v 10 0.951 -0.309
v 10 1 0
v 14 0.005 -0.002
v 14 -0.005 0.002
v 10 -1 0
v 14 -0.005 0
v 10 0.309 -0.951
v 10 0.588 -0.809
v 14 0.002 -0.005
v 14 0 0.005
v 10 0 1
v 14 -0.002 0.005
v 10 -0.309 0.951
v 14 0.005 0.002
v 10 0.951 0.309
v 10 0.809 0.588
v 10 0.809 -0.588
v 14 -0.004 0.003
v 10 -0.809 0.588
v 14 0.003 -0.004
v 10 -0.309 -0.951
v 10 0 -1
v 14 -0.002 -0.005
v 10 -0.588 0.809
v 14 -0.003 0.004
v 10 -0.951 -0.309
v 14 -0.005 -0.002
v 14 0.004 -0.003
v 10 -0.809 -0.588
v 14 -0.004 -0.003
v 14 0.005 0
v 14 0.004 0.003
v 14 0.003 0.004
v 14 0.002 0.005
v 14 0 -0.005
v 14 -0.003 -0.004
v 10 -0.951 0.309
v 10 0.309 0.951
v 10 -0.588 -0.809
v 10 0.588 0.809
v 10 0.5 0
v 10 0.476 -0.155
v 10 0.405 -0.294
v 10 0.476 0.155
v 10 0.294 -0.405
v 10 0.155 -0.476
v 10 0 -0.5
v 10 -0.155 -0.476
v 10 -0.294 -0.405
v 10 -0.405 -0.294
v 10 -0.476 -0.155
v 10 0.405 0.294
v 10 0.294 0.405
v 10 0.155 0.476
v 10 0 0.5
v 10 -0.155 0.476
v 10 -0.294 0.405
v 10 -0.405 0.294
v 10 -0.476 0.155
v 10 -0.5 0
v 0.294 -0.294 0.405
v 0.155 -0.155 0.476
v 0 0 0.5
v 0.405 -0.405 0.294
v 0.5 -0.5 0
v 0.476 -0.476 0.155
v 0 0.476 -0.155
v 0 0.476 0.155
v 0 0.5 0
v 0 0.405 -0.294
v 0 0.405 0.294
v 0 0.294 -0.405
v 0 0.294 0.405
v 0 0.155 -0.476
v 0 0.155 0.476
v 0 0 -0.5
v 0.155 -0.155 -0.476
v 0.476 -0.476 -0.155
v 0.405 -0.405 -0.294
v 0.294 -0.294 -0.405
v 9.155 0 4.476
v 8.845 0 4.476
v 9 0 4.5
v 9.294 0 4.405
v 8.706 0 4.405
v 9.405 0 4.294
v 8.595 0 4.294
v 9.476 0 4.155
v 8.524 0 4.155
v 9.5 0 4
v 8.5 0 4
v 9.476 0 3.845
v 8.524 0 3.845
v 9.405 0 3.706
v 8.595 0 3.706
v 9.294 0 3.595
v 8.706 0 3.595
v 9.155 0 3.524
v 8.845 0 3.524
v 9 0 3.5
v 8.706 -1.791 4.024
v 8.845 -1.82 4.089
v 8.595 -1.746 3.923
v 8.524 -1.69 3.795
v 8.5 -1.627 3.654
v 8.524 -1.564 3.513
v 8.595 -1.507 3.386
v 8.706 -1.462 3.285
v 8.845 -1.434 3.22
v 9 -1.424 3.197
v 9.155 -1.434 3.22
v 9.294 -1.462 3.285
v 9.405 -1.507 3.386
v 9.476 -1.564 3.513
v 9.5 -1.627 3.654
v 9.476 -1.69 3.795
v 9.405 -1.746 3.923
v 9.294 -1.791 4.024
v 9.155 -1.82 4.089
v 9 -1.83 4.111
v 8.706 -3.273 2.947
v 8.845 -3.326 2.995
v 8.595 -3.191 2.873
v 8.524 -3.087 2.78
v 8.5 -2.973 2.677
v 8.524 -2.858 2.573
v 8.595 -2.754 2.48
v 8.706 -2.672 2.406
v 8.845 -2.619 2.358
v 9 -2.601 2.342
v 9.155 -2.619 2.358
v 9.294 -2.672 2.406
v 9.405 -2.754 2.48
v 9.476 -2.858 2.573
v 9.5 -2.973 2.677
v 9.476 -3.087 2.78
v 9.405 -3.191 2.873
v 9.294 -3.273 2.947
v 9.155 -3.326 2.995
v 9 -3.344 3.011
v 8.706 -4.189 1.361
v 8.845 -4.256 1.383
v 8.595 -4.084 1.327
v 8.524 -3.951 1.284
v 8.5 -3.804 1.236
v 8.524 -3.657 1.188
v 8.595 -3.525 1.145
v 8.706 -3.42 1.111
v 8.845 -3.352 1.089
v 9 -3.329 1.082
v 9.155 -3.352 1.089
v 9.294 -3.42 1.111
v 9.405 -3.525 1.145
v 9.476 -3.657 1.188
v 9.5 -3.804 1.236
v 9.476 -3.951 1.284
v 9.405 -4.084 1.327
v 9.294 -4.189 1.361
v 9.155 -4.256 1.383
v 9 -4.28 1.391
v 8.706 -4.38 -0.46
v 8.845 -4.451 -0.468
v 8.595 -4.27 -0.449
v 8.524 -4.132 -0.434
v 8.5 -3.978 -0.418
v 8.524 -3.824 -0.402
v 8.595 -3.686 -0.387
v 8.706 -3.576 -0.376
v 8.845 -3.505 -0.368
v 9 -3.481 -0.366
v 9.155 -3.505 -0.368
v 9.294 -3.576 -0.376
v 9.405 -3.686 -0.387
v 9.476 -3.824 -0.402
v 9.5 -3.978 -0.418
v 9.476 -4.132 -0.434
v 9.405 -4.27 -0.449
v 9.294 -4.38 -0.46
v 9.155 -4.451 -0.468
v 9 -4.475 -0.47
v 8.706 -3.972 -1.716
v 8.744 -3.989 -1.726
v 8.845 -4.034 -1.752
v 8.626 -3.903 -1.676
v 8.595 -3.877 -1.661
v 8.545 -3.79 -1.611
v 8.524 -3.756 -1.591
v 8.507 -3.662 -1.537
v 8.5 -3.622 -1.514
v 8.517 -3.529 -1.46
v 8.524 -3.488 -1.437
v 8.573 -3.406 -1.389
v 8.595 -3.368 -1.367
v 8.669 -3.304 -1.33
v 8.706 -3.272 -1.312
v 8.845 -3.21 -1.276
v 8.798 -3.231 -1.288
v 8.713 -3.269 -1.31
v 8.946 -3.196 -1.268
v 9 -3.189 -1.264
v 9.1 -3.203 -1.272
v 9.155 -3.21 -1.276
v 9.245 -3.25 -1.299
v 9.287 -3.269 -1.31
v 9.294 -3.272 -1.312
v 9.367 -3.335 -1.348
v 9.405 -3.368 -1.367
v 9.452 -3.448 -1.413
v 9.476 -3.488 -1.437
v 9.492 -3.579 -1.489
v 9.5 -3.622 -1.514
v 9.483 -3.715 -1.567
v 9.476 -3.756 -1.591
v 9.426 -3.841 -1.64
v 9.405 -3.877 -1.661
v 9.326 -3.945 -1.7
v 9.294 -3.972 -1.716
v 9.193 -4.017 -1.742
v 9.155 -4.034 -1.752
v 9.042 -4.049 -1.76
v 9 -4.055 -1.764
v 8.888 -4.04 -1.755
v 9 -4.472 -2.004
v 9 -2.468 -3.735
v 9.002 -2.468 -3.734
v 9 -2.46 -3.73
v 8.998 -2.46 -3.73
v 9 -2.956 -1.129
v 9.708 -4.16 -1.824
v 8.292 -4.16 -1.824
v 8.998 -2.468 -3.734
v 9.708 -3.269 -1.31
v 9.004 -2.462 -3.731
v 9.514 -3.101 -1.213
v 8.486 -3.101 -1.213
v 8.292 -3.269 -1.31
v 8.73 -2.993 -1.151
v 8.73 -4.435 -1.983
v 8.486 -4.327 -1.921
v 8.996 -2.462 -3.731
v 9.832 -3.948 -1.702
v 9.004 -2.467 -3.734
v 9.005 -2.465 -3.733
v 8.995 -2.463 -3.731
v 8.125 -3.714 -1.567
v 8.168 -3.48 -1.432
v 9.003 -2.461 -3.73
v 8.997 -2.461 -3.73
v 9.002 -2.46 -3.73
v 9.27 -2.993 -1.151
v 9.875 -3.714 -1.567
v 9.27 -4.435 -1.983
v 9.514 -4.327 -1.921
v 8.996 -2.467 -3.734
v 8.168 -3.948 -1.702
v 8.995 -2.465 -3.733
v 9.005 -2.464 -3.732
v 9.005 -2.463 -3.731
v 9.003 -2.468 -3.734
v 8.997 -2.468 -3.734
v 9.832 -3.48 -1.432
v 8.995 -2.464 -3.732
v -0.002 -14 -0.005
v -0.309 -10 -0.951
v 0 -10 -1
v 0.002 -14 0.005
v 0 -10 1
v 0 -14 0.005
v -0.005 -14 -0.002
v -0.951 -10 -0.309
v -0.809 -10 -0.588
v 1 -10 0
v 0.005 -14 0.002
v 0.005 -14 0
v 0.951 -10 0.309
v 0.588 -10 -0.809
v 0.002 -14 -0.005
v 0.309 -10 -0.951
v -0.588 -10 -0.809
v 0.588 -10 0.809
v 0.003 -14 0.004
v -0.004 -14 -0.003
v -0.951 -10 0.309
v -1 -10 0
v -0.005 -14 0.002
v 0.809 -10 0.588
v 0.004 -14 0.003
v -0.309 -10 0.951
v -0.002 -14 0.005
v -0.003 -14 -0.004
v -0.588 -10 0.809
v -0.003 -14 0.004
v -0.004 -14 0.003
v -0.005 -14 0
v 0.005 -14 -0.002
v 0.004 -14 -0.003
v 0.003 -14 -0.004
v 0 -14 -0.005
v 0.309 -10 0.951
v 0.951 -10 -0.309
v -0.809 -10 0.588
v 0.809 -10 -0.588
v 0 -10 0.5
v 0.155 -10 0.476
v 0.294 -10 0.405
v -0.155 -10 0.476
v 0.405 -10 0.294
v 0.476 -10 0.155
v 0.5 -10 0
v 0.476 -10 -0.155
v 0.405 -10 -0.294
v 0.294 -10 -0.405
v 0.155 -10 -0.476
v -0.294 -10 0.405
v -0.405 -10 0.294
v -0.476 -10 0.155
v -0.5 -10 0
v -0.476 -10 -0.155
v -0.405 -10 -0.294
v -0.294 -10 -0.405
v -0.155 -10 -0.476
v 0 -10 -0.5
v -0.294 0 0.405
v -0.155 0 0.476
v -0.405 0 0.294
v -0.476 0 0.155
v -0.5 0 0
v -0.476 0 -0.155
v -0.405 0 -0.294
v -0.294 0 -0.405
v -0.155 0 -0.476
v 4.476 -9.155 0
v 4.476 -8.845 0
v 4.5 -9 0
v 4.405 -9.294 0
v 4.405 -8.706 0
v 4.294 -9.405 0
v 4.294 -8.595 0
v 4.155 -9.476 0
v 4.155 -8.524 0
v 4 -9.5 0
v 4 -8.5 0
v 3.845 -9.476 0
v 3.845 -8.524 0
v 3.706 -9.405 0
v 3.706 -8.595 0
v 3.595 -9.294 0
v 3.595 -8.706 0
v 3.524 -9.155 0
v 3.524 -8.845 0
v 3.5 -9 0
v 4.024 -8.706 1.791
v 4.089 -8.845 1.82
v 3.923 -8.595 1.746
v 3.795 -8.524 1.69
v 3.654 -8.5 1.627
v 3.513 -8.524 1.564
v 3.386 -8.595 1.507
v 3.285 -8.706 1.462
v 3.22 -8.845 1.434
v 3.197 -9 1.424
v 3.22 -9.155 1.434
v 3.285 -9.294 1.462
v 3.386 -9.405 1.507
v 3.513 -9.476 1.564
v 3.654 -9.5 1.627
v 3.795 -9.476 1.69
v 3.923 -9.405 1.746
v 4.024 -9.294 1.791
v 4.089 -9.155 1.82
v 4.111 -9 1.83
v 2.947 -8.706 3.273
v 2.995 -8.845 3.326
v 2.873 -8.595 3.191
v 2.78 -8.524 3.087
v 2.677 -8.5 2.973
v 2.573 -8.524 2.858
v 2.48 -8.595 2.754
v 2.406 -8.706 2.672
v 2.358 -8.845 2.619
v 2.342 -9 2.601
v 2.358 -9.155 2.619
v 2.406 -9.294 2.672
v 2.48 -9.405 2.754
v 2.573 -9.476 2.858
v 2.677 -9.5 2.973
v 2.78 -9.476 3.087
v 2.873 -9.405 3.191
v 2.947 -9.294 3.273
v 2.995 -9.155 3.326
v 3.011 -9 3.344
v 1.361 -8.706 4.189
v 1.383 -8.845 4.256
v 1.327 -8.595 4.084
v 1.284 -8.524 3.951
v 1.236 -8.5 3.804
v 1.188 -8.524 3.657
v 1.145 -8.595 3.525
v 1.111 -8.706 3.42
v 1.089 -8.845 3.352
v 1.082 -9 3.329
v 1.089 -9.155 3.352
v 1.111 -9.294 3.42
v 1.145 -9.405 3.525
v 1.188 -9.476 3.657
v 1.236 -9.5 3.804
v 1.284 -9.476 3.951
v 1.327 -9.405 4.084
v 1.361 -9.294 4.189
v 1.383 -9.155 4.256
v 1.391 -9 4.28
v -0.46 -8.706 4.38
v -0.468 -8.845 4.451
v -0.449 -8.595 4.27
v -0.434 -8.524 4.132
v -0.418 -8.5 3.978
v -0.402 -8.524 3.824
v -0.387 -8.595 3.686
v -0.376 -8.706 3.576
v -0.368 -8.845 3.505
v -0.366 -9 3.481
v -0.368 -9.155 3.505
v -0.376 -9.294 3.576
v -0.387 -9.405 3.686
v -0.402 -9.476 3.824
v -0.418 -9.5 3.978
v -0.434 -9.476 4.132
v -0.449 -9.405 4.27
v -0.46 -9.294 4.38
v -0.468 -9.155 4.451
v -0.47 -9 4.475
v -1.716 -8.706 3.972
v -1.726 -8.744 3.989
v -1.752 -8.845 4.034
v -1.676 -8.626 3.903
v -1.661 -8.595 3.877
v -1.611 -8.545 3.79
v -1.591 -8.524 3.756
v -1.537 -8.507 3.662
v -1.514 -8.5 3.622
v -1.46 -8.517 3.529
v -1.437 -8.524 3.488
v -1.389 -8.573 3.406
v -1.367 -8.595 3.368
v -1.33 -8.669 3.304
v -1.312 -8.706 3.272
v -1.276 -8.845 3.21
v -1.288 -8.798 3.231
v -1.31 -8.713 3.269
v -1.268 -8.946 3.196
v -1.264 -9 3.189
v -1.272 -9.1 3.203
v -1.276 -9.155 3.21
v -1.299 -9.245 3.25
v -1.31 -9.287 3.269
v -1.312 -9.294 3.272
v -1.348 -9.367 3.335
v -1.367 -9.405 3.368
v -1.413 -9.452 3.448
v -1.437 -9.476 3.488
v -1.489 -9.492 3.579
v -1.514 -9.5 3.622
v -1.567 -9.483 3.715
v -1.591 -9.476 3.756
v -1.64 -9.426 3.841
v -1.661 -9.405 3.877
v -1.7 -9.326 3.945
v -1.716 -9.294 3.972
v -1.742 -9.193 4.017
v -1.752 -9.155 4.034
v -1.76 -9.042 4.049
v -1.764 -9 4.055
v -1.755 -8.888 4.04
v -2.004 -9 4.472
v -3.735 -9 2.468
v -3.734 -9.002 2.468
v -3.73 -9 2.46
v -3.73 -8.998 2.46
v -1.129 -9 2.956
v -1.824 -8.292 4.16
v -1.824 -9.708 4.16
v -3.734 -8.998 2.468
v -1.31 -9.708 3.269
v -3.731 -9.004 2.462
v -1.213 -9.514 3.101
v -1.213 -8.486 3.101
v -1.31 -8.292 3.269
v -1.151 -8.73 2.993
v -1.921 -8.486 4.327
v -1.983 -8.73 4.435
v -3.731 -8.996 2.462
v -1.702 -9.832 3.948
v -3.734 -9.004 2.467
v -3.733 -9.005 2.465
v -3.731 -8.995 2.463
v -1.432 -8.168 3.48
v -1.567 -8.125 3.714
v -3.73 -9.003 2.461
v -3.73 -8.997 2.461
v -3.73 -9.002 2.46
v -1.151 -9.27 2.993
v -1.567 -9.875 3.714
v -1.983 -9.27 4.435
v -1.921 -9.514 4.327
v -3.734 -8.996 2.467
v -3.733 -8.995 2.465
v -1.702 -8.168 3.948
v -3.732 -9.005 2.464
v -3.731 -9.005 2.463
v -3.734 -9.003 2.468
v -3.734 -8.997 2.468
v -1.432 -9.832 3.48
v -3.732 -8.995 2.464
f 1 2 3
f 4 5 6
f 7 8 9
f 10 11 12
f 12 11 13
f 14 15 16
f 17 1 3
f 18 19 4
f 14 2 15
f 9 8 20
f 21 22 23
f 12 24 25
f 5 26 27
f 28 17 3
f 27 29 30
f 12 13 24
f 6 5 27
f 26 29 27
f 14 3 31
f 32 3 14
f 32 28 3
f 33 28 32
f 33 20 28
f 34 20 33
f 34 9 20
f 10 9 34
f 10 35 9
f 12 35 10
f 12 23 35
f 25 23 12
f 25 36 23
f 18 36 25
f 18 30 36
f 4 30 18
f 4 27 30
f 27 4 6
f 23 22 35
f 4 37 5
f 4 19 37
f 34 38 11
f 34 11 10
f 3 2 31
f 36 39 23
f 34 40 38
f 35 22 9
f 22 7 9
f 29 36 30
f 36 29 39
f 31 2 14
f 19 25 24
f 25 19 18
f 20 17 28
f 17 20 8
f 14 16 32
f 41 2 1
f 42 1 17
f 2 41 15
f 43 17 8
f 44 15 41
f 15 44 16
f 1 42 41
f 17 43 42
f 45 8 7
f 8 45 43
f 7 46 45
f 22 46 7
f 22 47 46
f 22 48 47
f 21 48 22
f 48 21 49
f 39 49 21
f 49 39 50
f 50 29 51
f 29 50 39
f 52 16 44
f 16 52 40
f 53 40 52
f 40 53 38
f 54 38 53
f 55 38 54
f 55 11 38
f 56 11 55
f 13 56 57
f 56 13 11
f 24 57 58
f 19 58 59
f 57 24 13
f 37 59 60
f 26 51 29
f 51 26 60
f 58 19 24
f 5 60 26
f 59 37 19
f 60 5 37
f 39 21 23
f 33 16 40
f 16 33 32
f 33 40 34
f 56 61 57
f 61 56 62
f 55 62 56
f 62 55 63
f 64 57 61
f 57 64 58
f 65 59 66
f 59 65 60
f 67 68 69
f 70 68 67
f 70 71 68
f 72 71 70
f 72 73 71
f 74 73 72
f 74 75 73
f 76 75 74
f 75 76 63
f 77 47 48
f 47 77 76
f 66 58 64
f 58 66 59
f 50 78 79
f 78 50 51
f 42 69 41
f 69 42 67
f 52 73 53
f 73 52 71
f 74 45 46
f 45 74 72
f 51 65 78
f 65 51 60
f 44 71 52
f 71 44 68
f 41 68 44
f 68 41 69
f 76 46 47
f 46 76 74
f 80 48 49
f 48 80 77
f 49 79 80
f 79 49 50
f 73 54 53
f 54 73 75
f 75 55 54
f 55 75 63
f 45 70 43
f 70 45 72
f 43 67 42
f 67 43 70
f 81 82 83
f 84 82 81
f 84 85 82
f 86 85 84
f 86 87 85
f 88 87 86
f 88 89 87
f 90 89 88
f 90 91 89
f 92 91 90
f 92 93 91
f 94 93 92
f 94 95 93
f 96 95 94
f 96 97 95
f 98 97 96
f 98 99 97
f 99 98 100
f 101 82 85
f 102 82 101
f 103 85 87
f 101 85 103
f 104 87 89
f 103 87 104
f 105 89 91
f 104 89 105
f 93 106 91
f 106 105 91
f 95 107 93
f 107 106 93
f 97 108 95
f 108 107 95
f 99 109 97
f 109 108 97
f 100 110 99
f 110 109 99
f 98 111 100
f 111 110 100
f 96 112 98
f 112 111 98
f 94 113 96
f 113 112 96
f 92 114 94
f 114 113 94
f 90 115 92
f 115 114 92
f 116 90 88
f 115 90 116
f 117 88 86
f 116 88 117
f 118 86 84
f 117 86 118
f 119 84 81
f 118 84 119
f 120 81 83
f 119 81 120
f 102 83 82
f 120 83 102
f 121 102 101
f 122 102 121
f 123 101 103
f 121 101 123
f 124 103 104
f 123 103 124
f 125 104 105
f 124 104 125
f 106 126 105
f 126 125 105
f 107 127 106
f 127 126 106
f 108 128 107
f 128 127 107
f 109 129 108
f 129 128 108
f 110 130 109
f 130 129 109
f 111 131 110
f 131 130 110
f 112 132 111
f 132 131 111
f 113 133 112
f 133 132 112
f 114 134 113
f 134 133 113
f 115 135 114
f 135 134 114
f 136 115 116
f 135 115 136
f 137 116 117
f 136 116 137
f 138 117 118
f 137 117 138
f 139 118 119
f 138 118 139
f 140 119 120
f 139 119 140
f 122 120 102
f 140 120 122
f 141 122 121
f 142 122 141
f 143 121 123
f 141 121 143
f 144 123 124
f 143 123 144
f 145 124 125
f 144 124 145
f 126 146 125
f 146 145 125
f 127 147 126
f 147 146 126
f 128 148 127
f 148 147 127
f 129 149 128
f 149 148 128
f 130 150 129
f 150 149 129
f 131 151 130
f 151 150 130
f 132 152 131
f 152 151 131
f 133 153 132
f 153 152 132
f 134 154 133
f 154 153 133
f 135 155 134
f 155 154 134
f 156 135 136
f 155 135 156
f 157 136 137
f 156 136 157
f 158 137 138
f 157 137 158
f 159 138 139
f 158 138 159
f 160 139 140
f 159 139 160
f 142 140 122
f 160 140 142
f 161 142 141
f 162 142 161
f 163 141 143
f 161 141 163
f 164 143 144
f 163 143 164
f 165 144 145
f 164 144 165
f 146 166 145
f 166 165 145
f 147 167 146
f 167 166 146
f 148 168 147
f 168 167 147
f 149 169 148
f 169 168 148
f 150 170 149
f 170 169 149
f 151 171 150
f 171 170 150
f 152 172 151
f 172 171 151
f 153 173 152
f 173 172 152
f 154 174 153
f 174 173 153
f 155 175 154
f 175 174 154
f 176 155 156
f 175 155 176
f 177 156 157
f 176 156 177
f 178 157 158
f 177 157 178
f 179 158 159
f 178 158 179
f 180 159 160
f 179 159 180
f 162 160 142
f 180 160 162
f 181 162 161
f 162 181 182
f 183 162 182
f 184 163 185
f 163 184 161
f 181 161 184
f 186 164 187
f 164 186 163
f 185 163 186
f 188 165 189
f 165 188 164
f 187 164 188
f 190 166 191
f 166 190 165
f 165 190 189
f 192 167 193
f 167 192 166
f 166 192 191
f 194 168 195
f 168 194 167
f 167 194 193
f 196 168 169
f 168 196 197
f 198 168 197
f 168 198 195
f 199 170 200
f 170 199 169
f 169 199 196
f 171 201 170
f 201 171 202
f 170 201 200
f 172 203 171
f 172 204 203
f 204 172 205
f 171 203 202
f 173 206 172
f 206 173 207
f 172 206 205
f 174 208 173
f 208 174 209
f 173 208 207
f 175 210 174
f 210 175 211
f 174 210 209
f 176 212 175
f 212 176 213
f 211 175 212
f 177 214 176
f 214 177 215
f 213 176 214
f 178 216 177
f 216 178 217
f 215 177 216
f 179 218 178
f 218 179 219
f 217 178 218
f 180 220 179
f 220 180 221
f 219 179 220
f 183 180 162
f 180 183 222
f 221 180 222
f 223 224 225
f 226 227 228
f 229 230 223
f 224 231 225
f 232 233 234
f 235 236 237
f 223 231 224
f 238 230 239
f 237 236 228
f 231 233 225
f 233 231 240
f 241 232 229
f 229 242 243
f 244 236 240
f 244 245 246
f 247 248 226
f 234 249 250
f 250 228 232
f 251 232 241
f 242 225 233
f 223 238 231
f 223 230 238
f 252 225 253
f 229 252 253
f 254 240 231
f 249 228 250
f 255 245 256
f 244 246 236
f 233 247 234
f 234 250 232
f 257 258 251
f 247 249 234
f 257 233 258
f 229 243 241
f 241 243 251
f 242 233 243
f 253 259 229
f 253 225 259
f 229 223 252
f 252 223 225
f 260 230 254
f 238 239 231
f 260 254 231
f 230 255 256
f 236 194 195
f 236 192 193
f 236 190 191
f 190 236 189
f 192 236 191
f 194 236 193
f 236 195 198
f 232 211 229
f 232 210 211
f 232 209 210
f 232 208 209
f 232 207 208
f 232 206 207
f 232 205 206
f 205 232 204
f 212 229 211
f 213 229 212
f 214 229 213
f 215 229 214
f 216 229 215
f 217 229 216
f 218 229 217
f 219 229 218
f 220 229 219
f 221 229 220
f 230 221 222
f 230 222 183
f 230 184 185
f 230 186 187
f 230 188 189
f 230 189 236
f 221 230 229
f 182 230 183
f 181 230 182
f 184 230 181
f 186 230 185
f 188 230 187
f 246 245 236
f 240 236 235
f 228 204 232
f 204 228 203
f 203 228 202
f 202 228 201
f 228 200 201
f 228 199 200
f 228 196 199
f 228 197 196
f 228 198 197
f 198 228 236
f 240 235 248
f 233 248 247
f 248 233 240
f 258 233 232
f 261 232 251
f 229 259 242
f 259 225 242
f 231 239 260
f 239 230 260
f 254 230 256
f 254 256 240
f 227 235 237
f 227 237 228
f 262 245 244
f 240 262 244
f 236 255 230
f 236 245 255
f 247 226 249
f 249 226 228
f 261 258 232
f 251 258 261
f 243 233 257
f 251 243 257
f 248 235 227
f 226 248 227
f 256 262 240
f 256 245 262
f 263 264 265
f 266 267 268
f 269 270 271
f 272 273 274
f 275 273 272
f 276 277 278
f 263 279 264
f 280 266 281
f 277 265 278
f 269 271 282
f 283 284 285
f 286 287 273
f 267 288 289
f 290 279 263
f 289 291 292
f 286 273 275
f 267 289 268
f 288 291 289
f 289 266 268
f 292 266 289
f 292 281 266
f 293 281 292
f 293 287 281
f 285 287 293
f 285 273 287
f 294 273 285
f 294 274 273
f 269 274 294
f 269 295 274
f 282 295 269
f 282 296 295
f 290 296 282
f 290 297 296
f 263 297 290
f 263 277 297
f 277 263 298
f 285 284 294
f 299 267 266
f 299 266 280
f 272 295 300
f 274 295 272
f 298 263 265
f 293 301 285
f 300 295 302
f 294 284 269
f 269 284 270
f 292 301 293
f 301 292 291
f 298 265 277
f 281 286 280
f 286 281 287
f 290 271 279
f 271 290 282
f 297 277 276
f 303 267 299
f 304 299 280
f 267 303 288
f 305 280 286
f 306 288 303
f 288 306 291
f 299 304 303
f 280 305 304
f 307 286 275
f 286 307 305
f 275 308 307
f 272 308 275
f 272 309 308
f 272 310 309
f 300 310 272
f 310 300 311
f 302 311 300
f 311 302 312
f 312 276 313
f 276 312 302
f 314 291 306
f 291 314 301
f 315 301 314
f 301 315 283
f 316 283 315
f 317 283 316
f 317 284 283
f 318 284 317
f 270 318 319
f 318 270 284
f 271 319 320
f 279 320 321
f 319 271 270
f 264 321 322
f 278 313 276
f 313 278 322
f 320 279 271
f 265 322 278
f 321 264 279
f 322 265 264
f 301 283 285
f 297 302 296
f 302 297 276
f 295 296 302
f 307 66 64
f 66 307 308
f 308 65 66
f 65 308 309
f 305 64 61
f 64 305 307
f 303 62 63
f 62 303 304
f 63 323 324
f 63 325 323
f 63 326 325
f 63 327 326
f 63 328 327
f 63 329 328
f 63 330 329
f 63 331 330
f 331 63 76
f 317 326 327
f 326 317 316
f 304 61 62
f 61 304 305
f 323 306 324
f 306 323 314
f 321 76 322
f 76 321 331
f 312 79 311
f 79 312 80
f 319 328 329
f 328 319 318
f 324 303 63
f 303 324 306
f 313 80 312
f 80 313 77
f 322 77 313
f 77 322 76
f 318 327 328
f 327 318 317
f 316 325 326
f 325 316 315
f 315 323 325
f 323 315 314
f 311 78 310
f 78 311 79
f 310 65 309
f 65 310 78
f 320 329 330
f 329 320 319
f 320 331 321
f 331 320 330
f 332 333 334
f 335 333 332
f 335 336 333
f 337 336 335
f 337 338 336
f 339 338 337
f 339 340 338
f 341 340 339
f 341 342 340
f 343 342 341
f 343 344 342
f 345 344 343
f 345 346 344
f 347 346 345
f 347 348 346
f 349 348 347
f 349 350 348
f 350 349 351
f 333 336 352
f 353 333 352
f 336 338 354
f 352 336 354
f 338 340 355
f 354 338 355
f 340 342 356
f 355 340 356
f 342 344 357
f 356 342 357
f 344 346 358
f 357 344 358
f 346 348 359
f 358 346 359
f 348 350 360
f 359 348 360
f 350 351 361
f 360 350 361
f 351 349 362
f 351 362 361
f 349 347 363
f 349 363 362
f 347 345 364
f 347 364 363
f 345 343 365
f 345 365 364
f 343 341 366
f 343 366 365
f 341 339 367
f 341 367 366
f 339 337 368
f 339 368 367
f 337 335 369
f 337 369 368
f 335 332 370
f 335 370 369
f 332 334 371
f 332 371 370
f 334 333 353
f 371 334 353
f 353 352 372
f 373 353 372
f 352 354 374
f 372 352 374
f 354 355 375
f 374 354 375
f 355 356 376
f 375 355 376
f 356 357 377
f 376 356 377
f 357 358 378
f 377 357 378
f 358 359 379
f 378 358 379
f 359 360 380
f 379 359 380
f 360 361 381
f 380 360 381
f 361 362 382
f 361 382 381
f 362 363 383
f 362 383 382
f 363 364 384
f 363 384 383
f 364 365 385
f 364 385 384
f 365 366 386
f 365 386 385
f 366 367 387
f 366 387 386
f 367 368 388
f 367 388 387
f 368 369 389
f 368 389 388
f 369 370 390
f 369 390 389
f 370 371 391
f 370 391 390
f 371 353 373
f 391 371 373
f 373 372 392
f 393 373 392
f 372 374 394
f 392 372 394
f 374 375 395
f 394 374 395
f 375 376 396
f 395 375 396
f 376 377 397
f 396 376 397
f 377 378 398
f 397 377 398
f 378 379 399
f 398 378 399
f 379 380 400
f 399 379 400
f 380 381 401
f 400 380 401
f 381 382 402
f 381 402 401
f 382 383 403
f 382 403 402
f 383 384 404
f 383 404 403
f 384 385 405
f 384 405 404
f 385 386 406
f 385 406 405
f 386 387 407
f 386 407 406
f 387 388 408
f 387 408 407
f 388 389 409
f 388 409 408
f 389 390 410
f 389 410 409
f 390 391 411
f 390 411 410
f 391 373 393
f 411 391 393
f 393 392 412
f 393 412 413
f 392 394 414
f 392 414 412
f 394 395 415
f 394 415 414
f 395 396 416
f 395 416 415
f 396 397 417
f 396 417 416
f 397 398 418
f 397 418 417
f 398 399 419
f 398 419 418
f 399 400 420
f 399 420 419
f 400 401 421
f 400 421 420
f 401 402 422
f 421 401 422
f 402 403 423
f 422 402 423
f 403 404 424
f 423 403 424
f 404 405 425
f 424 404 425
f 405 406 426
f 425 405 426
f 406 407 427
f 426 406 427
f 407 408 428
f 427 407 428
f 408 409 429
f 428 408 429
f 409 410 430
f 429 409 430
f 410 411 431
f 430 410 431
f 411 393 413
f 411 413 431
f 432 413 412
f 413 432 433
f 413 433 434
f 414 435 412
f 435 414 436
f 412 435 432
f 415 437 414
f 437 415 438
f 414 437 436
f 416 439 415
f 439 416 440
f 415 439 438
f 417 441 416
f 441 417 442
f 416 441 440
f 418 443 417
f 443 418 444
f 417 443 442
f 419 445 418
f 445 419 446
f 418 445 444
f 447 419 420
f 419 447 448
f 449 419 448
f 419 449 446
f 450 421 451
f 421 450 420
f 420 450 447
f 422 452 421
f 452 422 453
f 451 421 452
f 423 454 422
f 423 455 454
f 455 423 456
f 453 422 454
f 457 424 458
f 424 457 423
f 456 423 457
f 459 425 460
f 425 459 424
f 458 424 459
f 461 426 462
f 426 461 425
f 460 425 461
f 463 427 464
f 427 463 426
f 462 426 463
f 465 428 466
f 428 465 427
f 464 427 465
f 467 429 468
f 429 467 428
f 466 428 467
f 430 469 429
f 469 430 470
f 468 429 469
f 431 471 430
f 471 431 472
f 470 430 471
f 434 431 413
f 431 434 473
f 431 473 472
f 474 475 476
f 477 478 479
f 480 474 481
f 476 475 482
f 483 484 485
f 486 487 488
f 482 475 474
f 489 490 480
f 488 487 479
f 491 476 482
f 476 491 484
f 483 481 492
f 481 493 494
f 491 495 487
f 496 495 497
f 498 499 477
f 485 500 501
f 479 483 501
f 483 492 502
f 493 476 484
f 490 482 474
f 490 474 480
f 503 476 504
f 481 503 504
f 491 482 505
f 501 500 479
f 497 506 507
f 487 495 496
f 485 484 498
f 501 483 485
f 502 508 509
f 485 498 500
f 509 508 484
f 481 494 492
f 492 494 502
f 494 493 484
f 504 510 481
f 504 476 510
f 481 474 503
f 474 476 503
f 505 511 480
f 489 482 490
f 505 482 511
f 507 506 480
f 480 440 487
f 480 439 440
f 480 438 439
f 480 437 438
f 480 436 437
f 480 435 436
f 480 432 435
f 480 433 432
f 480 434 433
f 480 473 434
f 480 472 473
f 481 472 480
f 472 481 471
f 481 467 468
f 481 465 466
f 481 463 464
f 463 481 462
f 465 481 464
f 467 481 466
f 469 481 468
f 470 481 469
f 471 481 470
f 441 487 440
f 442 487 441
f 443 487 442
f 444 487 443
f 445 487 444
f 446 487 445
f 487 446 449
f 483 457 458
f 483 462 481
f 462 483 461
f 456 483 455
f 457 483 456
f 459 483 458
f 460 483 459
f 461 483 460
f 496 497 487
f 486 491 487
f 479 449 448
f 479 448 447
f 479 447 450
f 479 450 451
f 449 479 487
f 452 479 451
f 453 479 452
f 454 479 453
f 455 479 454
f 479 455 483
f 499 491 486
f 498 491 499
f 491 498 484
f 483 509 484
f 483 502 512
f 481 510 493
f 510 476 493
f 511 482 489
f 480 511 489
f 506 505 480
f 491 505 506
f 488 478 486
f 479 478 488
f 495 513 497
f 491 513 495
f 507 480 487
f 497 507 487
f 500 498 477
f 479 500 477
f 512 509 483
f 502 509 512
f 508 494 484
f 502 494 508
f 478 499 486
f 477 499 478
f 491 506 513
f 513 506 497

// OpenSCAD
// file: axes.scad
module arrow(){
   body_h = 10;
   d = 1;
   arrow_base = 2;
   arrow_head_length = 4;
   
   translate([0,0,body_h]){
   cylinder ( d1 = arrow_base, d2 = 0.01, h =arrow_head_length, $fn = 20);
   }
   cylinder( d= 1, h = body_h,$fn = 20);
}

module rotation_arrow_rhs(){
rotate_extrude(angle = 120){
   translate([4,0,0]){
      circle ( d= 1, $fn = 20);
   }
}
rotate([0,0,120]){ 

rotate([90,0,0]){
      translate([4,0,-2]){
      cylinder ( d1 = 0.01, d2 = 1.75, h =2.5, $fn = 20);
   }
}
}
}
module rotation_arrow_lhs(){
   mirror([0,1,0]){
      rotation_arrow_rhs();
   }
}




module arrow_n_rotation_arrow_rhs(){
   arrow();
translate([0,0,9]){
rotation_arrow_rhs();
}
}

module arrow_n_rotation_arrow_lhs(){
   arrow();
translate([0,0,9]){
rotation_arrow_lhs();
}
}

//arrow();
module RHR_axes(){
   color("red"){
      translate([15,-2,-2]){
         rotate([0,-90,0]){
            text("X", size = 4);
         }
      }
      rotate([0,90,0]){
         children(0);
      }
   }  
   color("green"){
      translate([-2,15,-2]){
         rotate([90,0,0]){
            text("Y", size = 4);
         }
      }
      rotate([-90,0,0]){
       children(1);
      }
   }   
   
   color("blue"){
   translate([-2,-2,15]){
       rotate([0,0,0]){
          text("Z", size = 4);
       }
   }
   rotate([0,0,0]){
      children(2);
      }
   }   
   
}


RHR_axes(){
   arrow_n_rotation_arrow_rhs(); 
   arrow_n_rotation_arrow_rhs();
   arrow_n_rotation_arrow_rhs();
}




//RHR_axes();
// main file
// NED_axes

use <axes.scad>


module NED_axes(){
   rotate([180,0,0]){
      RHR_axes(){
         arrow_n_rotation_arrow_rhs(); 
         arrow_n_rotation_arrow_rhs();
         arrow_n_rotation_arrow_rhs();
      }
   }
}

NED_axes();
